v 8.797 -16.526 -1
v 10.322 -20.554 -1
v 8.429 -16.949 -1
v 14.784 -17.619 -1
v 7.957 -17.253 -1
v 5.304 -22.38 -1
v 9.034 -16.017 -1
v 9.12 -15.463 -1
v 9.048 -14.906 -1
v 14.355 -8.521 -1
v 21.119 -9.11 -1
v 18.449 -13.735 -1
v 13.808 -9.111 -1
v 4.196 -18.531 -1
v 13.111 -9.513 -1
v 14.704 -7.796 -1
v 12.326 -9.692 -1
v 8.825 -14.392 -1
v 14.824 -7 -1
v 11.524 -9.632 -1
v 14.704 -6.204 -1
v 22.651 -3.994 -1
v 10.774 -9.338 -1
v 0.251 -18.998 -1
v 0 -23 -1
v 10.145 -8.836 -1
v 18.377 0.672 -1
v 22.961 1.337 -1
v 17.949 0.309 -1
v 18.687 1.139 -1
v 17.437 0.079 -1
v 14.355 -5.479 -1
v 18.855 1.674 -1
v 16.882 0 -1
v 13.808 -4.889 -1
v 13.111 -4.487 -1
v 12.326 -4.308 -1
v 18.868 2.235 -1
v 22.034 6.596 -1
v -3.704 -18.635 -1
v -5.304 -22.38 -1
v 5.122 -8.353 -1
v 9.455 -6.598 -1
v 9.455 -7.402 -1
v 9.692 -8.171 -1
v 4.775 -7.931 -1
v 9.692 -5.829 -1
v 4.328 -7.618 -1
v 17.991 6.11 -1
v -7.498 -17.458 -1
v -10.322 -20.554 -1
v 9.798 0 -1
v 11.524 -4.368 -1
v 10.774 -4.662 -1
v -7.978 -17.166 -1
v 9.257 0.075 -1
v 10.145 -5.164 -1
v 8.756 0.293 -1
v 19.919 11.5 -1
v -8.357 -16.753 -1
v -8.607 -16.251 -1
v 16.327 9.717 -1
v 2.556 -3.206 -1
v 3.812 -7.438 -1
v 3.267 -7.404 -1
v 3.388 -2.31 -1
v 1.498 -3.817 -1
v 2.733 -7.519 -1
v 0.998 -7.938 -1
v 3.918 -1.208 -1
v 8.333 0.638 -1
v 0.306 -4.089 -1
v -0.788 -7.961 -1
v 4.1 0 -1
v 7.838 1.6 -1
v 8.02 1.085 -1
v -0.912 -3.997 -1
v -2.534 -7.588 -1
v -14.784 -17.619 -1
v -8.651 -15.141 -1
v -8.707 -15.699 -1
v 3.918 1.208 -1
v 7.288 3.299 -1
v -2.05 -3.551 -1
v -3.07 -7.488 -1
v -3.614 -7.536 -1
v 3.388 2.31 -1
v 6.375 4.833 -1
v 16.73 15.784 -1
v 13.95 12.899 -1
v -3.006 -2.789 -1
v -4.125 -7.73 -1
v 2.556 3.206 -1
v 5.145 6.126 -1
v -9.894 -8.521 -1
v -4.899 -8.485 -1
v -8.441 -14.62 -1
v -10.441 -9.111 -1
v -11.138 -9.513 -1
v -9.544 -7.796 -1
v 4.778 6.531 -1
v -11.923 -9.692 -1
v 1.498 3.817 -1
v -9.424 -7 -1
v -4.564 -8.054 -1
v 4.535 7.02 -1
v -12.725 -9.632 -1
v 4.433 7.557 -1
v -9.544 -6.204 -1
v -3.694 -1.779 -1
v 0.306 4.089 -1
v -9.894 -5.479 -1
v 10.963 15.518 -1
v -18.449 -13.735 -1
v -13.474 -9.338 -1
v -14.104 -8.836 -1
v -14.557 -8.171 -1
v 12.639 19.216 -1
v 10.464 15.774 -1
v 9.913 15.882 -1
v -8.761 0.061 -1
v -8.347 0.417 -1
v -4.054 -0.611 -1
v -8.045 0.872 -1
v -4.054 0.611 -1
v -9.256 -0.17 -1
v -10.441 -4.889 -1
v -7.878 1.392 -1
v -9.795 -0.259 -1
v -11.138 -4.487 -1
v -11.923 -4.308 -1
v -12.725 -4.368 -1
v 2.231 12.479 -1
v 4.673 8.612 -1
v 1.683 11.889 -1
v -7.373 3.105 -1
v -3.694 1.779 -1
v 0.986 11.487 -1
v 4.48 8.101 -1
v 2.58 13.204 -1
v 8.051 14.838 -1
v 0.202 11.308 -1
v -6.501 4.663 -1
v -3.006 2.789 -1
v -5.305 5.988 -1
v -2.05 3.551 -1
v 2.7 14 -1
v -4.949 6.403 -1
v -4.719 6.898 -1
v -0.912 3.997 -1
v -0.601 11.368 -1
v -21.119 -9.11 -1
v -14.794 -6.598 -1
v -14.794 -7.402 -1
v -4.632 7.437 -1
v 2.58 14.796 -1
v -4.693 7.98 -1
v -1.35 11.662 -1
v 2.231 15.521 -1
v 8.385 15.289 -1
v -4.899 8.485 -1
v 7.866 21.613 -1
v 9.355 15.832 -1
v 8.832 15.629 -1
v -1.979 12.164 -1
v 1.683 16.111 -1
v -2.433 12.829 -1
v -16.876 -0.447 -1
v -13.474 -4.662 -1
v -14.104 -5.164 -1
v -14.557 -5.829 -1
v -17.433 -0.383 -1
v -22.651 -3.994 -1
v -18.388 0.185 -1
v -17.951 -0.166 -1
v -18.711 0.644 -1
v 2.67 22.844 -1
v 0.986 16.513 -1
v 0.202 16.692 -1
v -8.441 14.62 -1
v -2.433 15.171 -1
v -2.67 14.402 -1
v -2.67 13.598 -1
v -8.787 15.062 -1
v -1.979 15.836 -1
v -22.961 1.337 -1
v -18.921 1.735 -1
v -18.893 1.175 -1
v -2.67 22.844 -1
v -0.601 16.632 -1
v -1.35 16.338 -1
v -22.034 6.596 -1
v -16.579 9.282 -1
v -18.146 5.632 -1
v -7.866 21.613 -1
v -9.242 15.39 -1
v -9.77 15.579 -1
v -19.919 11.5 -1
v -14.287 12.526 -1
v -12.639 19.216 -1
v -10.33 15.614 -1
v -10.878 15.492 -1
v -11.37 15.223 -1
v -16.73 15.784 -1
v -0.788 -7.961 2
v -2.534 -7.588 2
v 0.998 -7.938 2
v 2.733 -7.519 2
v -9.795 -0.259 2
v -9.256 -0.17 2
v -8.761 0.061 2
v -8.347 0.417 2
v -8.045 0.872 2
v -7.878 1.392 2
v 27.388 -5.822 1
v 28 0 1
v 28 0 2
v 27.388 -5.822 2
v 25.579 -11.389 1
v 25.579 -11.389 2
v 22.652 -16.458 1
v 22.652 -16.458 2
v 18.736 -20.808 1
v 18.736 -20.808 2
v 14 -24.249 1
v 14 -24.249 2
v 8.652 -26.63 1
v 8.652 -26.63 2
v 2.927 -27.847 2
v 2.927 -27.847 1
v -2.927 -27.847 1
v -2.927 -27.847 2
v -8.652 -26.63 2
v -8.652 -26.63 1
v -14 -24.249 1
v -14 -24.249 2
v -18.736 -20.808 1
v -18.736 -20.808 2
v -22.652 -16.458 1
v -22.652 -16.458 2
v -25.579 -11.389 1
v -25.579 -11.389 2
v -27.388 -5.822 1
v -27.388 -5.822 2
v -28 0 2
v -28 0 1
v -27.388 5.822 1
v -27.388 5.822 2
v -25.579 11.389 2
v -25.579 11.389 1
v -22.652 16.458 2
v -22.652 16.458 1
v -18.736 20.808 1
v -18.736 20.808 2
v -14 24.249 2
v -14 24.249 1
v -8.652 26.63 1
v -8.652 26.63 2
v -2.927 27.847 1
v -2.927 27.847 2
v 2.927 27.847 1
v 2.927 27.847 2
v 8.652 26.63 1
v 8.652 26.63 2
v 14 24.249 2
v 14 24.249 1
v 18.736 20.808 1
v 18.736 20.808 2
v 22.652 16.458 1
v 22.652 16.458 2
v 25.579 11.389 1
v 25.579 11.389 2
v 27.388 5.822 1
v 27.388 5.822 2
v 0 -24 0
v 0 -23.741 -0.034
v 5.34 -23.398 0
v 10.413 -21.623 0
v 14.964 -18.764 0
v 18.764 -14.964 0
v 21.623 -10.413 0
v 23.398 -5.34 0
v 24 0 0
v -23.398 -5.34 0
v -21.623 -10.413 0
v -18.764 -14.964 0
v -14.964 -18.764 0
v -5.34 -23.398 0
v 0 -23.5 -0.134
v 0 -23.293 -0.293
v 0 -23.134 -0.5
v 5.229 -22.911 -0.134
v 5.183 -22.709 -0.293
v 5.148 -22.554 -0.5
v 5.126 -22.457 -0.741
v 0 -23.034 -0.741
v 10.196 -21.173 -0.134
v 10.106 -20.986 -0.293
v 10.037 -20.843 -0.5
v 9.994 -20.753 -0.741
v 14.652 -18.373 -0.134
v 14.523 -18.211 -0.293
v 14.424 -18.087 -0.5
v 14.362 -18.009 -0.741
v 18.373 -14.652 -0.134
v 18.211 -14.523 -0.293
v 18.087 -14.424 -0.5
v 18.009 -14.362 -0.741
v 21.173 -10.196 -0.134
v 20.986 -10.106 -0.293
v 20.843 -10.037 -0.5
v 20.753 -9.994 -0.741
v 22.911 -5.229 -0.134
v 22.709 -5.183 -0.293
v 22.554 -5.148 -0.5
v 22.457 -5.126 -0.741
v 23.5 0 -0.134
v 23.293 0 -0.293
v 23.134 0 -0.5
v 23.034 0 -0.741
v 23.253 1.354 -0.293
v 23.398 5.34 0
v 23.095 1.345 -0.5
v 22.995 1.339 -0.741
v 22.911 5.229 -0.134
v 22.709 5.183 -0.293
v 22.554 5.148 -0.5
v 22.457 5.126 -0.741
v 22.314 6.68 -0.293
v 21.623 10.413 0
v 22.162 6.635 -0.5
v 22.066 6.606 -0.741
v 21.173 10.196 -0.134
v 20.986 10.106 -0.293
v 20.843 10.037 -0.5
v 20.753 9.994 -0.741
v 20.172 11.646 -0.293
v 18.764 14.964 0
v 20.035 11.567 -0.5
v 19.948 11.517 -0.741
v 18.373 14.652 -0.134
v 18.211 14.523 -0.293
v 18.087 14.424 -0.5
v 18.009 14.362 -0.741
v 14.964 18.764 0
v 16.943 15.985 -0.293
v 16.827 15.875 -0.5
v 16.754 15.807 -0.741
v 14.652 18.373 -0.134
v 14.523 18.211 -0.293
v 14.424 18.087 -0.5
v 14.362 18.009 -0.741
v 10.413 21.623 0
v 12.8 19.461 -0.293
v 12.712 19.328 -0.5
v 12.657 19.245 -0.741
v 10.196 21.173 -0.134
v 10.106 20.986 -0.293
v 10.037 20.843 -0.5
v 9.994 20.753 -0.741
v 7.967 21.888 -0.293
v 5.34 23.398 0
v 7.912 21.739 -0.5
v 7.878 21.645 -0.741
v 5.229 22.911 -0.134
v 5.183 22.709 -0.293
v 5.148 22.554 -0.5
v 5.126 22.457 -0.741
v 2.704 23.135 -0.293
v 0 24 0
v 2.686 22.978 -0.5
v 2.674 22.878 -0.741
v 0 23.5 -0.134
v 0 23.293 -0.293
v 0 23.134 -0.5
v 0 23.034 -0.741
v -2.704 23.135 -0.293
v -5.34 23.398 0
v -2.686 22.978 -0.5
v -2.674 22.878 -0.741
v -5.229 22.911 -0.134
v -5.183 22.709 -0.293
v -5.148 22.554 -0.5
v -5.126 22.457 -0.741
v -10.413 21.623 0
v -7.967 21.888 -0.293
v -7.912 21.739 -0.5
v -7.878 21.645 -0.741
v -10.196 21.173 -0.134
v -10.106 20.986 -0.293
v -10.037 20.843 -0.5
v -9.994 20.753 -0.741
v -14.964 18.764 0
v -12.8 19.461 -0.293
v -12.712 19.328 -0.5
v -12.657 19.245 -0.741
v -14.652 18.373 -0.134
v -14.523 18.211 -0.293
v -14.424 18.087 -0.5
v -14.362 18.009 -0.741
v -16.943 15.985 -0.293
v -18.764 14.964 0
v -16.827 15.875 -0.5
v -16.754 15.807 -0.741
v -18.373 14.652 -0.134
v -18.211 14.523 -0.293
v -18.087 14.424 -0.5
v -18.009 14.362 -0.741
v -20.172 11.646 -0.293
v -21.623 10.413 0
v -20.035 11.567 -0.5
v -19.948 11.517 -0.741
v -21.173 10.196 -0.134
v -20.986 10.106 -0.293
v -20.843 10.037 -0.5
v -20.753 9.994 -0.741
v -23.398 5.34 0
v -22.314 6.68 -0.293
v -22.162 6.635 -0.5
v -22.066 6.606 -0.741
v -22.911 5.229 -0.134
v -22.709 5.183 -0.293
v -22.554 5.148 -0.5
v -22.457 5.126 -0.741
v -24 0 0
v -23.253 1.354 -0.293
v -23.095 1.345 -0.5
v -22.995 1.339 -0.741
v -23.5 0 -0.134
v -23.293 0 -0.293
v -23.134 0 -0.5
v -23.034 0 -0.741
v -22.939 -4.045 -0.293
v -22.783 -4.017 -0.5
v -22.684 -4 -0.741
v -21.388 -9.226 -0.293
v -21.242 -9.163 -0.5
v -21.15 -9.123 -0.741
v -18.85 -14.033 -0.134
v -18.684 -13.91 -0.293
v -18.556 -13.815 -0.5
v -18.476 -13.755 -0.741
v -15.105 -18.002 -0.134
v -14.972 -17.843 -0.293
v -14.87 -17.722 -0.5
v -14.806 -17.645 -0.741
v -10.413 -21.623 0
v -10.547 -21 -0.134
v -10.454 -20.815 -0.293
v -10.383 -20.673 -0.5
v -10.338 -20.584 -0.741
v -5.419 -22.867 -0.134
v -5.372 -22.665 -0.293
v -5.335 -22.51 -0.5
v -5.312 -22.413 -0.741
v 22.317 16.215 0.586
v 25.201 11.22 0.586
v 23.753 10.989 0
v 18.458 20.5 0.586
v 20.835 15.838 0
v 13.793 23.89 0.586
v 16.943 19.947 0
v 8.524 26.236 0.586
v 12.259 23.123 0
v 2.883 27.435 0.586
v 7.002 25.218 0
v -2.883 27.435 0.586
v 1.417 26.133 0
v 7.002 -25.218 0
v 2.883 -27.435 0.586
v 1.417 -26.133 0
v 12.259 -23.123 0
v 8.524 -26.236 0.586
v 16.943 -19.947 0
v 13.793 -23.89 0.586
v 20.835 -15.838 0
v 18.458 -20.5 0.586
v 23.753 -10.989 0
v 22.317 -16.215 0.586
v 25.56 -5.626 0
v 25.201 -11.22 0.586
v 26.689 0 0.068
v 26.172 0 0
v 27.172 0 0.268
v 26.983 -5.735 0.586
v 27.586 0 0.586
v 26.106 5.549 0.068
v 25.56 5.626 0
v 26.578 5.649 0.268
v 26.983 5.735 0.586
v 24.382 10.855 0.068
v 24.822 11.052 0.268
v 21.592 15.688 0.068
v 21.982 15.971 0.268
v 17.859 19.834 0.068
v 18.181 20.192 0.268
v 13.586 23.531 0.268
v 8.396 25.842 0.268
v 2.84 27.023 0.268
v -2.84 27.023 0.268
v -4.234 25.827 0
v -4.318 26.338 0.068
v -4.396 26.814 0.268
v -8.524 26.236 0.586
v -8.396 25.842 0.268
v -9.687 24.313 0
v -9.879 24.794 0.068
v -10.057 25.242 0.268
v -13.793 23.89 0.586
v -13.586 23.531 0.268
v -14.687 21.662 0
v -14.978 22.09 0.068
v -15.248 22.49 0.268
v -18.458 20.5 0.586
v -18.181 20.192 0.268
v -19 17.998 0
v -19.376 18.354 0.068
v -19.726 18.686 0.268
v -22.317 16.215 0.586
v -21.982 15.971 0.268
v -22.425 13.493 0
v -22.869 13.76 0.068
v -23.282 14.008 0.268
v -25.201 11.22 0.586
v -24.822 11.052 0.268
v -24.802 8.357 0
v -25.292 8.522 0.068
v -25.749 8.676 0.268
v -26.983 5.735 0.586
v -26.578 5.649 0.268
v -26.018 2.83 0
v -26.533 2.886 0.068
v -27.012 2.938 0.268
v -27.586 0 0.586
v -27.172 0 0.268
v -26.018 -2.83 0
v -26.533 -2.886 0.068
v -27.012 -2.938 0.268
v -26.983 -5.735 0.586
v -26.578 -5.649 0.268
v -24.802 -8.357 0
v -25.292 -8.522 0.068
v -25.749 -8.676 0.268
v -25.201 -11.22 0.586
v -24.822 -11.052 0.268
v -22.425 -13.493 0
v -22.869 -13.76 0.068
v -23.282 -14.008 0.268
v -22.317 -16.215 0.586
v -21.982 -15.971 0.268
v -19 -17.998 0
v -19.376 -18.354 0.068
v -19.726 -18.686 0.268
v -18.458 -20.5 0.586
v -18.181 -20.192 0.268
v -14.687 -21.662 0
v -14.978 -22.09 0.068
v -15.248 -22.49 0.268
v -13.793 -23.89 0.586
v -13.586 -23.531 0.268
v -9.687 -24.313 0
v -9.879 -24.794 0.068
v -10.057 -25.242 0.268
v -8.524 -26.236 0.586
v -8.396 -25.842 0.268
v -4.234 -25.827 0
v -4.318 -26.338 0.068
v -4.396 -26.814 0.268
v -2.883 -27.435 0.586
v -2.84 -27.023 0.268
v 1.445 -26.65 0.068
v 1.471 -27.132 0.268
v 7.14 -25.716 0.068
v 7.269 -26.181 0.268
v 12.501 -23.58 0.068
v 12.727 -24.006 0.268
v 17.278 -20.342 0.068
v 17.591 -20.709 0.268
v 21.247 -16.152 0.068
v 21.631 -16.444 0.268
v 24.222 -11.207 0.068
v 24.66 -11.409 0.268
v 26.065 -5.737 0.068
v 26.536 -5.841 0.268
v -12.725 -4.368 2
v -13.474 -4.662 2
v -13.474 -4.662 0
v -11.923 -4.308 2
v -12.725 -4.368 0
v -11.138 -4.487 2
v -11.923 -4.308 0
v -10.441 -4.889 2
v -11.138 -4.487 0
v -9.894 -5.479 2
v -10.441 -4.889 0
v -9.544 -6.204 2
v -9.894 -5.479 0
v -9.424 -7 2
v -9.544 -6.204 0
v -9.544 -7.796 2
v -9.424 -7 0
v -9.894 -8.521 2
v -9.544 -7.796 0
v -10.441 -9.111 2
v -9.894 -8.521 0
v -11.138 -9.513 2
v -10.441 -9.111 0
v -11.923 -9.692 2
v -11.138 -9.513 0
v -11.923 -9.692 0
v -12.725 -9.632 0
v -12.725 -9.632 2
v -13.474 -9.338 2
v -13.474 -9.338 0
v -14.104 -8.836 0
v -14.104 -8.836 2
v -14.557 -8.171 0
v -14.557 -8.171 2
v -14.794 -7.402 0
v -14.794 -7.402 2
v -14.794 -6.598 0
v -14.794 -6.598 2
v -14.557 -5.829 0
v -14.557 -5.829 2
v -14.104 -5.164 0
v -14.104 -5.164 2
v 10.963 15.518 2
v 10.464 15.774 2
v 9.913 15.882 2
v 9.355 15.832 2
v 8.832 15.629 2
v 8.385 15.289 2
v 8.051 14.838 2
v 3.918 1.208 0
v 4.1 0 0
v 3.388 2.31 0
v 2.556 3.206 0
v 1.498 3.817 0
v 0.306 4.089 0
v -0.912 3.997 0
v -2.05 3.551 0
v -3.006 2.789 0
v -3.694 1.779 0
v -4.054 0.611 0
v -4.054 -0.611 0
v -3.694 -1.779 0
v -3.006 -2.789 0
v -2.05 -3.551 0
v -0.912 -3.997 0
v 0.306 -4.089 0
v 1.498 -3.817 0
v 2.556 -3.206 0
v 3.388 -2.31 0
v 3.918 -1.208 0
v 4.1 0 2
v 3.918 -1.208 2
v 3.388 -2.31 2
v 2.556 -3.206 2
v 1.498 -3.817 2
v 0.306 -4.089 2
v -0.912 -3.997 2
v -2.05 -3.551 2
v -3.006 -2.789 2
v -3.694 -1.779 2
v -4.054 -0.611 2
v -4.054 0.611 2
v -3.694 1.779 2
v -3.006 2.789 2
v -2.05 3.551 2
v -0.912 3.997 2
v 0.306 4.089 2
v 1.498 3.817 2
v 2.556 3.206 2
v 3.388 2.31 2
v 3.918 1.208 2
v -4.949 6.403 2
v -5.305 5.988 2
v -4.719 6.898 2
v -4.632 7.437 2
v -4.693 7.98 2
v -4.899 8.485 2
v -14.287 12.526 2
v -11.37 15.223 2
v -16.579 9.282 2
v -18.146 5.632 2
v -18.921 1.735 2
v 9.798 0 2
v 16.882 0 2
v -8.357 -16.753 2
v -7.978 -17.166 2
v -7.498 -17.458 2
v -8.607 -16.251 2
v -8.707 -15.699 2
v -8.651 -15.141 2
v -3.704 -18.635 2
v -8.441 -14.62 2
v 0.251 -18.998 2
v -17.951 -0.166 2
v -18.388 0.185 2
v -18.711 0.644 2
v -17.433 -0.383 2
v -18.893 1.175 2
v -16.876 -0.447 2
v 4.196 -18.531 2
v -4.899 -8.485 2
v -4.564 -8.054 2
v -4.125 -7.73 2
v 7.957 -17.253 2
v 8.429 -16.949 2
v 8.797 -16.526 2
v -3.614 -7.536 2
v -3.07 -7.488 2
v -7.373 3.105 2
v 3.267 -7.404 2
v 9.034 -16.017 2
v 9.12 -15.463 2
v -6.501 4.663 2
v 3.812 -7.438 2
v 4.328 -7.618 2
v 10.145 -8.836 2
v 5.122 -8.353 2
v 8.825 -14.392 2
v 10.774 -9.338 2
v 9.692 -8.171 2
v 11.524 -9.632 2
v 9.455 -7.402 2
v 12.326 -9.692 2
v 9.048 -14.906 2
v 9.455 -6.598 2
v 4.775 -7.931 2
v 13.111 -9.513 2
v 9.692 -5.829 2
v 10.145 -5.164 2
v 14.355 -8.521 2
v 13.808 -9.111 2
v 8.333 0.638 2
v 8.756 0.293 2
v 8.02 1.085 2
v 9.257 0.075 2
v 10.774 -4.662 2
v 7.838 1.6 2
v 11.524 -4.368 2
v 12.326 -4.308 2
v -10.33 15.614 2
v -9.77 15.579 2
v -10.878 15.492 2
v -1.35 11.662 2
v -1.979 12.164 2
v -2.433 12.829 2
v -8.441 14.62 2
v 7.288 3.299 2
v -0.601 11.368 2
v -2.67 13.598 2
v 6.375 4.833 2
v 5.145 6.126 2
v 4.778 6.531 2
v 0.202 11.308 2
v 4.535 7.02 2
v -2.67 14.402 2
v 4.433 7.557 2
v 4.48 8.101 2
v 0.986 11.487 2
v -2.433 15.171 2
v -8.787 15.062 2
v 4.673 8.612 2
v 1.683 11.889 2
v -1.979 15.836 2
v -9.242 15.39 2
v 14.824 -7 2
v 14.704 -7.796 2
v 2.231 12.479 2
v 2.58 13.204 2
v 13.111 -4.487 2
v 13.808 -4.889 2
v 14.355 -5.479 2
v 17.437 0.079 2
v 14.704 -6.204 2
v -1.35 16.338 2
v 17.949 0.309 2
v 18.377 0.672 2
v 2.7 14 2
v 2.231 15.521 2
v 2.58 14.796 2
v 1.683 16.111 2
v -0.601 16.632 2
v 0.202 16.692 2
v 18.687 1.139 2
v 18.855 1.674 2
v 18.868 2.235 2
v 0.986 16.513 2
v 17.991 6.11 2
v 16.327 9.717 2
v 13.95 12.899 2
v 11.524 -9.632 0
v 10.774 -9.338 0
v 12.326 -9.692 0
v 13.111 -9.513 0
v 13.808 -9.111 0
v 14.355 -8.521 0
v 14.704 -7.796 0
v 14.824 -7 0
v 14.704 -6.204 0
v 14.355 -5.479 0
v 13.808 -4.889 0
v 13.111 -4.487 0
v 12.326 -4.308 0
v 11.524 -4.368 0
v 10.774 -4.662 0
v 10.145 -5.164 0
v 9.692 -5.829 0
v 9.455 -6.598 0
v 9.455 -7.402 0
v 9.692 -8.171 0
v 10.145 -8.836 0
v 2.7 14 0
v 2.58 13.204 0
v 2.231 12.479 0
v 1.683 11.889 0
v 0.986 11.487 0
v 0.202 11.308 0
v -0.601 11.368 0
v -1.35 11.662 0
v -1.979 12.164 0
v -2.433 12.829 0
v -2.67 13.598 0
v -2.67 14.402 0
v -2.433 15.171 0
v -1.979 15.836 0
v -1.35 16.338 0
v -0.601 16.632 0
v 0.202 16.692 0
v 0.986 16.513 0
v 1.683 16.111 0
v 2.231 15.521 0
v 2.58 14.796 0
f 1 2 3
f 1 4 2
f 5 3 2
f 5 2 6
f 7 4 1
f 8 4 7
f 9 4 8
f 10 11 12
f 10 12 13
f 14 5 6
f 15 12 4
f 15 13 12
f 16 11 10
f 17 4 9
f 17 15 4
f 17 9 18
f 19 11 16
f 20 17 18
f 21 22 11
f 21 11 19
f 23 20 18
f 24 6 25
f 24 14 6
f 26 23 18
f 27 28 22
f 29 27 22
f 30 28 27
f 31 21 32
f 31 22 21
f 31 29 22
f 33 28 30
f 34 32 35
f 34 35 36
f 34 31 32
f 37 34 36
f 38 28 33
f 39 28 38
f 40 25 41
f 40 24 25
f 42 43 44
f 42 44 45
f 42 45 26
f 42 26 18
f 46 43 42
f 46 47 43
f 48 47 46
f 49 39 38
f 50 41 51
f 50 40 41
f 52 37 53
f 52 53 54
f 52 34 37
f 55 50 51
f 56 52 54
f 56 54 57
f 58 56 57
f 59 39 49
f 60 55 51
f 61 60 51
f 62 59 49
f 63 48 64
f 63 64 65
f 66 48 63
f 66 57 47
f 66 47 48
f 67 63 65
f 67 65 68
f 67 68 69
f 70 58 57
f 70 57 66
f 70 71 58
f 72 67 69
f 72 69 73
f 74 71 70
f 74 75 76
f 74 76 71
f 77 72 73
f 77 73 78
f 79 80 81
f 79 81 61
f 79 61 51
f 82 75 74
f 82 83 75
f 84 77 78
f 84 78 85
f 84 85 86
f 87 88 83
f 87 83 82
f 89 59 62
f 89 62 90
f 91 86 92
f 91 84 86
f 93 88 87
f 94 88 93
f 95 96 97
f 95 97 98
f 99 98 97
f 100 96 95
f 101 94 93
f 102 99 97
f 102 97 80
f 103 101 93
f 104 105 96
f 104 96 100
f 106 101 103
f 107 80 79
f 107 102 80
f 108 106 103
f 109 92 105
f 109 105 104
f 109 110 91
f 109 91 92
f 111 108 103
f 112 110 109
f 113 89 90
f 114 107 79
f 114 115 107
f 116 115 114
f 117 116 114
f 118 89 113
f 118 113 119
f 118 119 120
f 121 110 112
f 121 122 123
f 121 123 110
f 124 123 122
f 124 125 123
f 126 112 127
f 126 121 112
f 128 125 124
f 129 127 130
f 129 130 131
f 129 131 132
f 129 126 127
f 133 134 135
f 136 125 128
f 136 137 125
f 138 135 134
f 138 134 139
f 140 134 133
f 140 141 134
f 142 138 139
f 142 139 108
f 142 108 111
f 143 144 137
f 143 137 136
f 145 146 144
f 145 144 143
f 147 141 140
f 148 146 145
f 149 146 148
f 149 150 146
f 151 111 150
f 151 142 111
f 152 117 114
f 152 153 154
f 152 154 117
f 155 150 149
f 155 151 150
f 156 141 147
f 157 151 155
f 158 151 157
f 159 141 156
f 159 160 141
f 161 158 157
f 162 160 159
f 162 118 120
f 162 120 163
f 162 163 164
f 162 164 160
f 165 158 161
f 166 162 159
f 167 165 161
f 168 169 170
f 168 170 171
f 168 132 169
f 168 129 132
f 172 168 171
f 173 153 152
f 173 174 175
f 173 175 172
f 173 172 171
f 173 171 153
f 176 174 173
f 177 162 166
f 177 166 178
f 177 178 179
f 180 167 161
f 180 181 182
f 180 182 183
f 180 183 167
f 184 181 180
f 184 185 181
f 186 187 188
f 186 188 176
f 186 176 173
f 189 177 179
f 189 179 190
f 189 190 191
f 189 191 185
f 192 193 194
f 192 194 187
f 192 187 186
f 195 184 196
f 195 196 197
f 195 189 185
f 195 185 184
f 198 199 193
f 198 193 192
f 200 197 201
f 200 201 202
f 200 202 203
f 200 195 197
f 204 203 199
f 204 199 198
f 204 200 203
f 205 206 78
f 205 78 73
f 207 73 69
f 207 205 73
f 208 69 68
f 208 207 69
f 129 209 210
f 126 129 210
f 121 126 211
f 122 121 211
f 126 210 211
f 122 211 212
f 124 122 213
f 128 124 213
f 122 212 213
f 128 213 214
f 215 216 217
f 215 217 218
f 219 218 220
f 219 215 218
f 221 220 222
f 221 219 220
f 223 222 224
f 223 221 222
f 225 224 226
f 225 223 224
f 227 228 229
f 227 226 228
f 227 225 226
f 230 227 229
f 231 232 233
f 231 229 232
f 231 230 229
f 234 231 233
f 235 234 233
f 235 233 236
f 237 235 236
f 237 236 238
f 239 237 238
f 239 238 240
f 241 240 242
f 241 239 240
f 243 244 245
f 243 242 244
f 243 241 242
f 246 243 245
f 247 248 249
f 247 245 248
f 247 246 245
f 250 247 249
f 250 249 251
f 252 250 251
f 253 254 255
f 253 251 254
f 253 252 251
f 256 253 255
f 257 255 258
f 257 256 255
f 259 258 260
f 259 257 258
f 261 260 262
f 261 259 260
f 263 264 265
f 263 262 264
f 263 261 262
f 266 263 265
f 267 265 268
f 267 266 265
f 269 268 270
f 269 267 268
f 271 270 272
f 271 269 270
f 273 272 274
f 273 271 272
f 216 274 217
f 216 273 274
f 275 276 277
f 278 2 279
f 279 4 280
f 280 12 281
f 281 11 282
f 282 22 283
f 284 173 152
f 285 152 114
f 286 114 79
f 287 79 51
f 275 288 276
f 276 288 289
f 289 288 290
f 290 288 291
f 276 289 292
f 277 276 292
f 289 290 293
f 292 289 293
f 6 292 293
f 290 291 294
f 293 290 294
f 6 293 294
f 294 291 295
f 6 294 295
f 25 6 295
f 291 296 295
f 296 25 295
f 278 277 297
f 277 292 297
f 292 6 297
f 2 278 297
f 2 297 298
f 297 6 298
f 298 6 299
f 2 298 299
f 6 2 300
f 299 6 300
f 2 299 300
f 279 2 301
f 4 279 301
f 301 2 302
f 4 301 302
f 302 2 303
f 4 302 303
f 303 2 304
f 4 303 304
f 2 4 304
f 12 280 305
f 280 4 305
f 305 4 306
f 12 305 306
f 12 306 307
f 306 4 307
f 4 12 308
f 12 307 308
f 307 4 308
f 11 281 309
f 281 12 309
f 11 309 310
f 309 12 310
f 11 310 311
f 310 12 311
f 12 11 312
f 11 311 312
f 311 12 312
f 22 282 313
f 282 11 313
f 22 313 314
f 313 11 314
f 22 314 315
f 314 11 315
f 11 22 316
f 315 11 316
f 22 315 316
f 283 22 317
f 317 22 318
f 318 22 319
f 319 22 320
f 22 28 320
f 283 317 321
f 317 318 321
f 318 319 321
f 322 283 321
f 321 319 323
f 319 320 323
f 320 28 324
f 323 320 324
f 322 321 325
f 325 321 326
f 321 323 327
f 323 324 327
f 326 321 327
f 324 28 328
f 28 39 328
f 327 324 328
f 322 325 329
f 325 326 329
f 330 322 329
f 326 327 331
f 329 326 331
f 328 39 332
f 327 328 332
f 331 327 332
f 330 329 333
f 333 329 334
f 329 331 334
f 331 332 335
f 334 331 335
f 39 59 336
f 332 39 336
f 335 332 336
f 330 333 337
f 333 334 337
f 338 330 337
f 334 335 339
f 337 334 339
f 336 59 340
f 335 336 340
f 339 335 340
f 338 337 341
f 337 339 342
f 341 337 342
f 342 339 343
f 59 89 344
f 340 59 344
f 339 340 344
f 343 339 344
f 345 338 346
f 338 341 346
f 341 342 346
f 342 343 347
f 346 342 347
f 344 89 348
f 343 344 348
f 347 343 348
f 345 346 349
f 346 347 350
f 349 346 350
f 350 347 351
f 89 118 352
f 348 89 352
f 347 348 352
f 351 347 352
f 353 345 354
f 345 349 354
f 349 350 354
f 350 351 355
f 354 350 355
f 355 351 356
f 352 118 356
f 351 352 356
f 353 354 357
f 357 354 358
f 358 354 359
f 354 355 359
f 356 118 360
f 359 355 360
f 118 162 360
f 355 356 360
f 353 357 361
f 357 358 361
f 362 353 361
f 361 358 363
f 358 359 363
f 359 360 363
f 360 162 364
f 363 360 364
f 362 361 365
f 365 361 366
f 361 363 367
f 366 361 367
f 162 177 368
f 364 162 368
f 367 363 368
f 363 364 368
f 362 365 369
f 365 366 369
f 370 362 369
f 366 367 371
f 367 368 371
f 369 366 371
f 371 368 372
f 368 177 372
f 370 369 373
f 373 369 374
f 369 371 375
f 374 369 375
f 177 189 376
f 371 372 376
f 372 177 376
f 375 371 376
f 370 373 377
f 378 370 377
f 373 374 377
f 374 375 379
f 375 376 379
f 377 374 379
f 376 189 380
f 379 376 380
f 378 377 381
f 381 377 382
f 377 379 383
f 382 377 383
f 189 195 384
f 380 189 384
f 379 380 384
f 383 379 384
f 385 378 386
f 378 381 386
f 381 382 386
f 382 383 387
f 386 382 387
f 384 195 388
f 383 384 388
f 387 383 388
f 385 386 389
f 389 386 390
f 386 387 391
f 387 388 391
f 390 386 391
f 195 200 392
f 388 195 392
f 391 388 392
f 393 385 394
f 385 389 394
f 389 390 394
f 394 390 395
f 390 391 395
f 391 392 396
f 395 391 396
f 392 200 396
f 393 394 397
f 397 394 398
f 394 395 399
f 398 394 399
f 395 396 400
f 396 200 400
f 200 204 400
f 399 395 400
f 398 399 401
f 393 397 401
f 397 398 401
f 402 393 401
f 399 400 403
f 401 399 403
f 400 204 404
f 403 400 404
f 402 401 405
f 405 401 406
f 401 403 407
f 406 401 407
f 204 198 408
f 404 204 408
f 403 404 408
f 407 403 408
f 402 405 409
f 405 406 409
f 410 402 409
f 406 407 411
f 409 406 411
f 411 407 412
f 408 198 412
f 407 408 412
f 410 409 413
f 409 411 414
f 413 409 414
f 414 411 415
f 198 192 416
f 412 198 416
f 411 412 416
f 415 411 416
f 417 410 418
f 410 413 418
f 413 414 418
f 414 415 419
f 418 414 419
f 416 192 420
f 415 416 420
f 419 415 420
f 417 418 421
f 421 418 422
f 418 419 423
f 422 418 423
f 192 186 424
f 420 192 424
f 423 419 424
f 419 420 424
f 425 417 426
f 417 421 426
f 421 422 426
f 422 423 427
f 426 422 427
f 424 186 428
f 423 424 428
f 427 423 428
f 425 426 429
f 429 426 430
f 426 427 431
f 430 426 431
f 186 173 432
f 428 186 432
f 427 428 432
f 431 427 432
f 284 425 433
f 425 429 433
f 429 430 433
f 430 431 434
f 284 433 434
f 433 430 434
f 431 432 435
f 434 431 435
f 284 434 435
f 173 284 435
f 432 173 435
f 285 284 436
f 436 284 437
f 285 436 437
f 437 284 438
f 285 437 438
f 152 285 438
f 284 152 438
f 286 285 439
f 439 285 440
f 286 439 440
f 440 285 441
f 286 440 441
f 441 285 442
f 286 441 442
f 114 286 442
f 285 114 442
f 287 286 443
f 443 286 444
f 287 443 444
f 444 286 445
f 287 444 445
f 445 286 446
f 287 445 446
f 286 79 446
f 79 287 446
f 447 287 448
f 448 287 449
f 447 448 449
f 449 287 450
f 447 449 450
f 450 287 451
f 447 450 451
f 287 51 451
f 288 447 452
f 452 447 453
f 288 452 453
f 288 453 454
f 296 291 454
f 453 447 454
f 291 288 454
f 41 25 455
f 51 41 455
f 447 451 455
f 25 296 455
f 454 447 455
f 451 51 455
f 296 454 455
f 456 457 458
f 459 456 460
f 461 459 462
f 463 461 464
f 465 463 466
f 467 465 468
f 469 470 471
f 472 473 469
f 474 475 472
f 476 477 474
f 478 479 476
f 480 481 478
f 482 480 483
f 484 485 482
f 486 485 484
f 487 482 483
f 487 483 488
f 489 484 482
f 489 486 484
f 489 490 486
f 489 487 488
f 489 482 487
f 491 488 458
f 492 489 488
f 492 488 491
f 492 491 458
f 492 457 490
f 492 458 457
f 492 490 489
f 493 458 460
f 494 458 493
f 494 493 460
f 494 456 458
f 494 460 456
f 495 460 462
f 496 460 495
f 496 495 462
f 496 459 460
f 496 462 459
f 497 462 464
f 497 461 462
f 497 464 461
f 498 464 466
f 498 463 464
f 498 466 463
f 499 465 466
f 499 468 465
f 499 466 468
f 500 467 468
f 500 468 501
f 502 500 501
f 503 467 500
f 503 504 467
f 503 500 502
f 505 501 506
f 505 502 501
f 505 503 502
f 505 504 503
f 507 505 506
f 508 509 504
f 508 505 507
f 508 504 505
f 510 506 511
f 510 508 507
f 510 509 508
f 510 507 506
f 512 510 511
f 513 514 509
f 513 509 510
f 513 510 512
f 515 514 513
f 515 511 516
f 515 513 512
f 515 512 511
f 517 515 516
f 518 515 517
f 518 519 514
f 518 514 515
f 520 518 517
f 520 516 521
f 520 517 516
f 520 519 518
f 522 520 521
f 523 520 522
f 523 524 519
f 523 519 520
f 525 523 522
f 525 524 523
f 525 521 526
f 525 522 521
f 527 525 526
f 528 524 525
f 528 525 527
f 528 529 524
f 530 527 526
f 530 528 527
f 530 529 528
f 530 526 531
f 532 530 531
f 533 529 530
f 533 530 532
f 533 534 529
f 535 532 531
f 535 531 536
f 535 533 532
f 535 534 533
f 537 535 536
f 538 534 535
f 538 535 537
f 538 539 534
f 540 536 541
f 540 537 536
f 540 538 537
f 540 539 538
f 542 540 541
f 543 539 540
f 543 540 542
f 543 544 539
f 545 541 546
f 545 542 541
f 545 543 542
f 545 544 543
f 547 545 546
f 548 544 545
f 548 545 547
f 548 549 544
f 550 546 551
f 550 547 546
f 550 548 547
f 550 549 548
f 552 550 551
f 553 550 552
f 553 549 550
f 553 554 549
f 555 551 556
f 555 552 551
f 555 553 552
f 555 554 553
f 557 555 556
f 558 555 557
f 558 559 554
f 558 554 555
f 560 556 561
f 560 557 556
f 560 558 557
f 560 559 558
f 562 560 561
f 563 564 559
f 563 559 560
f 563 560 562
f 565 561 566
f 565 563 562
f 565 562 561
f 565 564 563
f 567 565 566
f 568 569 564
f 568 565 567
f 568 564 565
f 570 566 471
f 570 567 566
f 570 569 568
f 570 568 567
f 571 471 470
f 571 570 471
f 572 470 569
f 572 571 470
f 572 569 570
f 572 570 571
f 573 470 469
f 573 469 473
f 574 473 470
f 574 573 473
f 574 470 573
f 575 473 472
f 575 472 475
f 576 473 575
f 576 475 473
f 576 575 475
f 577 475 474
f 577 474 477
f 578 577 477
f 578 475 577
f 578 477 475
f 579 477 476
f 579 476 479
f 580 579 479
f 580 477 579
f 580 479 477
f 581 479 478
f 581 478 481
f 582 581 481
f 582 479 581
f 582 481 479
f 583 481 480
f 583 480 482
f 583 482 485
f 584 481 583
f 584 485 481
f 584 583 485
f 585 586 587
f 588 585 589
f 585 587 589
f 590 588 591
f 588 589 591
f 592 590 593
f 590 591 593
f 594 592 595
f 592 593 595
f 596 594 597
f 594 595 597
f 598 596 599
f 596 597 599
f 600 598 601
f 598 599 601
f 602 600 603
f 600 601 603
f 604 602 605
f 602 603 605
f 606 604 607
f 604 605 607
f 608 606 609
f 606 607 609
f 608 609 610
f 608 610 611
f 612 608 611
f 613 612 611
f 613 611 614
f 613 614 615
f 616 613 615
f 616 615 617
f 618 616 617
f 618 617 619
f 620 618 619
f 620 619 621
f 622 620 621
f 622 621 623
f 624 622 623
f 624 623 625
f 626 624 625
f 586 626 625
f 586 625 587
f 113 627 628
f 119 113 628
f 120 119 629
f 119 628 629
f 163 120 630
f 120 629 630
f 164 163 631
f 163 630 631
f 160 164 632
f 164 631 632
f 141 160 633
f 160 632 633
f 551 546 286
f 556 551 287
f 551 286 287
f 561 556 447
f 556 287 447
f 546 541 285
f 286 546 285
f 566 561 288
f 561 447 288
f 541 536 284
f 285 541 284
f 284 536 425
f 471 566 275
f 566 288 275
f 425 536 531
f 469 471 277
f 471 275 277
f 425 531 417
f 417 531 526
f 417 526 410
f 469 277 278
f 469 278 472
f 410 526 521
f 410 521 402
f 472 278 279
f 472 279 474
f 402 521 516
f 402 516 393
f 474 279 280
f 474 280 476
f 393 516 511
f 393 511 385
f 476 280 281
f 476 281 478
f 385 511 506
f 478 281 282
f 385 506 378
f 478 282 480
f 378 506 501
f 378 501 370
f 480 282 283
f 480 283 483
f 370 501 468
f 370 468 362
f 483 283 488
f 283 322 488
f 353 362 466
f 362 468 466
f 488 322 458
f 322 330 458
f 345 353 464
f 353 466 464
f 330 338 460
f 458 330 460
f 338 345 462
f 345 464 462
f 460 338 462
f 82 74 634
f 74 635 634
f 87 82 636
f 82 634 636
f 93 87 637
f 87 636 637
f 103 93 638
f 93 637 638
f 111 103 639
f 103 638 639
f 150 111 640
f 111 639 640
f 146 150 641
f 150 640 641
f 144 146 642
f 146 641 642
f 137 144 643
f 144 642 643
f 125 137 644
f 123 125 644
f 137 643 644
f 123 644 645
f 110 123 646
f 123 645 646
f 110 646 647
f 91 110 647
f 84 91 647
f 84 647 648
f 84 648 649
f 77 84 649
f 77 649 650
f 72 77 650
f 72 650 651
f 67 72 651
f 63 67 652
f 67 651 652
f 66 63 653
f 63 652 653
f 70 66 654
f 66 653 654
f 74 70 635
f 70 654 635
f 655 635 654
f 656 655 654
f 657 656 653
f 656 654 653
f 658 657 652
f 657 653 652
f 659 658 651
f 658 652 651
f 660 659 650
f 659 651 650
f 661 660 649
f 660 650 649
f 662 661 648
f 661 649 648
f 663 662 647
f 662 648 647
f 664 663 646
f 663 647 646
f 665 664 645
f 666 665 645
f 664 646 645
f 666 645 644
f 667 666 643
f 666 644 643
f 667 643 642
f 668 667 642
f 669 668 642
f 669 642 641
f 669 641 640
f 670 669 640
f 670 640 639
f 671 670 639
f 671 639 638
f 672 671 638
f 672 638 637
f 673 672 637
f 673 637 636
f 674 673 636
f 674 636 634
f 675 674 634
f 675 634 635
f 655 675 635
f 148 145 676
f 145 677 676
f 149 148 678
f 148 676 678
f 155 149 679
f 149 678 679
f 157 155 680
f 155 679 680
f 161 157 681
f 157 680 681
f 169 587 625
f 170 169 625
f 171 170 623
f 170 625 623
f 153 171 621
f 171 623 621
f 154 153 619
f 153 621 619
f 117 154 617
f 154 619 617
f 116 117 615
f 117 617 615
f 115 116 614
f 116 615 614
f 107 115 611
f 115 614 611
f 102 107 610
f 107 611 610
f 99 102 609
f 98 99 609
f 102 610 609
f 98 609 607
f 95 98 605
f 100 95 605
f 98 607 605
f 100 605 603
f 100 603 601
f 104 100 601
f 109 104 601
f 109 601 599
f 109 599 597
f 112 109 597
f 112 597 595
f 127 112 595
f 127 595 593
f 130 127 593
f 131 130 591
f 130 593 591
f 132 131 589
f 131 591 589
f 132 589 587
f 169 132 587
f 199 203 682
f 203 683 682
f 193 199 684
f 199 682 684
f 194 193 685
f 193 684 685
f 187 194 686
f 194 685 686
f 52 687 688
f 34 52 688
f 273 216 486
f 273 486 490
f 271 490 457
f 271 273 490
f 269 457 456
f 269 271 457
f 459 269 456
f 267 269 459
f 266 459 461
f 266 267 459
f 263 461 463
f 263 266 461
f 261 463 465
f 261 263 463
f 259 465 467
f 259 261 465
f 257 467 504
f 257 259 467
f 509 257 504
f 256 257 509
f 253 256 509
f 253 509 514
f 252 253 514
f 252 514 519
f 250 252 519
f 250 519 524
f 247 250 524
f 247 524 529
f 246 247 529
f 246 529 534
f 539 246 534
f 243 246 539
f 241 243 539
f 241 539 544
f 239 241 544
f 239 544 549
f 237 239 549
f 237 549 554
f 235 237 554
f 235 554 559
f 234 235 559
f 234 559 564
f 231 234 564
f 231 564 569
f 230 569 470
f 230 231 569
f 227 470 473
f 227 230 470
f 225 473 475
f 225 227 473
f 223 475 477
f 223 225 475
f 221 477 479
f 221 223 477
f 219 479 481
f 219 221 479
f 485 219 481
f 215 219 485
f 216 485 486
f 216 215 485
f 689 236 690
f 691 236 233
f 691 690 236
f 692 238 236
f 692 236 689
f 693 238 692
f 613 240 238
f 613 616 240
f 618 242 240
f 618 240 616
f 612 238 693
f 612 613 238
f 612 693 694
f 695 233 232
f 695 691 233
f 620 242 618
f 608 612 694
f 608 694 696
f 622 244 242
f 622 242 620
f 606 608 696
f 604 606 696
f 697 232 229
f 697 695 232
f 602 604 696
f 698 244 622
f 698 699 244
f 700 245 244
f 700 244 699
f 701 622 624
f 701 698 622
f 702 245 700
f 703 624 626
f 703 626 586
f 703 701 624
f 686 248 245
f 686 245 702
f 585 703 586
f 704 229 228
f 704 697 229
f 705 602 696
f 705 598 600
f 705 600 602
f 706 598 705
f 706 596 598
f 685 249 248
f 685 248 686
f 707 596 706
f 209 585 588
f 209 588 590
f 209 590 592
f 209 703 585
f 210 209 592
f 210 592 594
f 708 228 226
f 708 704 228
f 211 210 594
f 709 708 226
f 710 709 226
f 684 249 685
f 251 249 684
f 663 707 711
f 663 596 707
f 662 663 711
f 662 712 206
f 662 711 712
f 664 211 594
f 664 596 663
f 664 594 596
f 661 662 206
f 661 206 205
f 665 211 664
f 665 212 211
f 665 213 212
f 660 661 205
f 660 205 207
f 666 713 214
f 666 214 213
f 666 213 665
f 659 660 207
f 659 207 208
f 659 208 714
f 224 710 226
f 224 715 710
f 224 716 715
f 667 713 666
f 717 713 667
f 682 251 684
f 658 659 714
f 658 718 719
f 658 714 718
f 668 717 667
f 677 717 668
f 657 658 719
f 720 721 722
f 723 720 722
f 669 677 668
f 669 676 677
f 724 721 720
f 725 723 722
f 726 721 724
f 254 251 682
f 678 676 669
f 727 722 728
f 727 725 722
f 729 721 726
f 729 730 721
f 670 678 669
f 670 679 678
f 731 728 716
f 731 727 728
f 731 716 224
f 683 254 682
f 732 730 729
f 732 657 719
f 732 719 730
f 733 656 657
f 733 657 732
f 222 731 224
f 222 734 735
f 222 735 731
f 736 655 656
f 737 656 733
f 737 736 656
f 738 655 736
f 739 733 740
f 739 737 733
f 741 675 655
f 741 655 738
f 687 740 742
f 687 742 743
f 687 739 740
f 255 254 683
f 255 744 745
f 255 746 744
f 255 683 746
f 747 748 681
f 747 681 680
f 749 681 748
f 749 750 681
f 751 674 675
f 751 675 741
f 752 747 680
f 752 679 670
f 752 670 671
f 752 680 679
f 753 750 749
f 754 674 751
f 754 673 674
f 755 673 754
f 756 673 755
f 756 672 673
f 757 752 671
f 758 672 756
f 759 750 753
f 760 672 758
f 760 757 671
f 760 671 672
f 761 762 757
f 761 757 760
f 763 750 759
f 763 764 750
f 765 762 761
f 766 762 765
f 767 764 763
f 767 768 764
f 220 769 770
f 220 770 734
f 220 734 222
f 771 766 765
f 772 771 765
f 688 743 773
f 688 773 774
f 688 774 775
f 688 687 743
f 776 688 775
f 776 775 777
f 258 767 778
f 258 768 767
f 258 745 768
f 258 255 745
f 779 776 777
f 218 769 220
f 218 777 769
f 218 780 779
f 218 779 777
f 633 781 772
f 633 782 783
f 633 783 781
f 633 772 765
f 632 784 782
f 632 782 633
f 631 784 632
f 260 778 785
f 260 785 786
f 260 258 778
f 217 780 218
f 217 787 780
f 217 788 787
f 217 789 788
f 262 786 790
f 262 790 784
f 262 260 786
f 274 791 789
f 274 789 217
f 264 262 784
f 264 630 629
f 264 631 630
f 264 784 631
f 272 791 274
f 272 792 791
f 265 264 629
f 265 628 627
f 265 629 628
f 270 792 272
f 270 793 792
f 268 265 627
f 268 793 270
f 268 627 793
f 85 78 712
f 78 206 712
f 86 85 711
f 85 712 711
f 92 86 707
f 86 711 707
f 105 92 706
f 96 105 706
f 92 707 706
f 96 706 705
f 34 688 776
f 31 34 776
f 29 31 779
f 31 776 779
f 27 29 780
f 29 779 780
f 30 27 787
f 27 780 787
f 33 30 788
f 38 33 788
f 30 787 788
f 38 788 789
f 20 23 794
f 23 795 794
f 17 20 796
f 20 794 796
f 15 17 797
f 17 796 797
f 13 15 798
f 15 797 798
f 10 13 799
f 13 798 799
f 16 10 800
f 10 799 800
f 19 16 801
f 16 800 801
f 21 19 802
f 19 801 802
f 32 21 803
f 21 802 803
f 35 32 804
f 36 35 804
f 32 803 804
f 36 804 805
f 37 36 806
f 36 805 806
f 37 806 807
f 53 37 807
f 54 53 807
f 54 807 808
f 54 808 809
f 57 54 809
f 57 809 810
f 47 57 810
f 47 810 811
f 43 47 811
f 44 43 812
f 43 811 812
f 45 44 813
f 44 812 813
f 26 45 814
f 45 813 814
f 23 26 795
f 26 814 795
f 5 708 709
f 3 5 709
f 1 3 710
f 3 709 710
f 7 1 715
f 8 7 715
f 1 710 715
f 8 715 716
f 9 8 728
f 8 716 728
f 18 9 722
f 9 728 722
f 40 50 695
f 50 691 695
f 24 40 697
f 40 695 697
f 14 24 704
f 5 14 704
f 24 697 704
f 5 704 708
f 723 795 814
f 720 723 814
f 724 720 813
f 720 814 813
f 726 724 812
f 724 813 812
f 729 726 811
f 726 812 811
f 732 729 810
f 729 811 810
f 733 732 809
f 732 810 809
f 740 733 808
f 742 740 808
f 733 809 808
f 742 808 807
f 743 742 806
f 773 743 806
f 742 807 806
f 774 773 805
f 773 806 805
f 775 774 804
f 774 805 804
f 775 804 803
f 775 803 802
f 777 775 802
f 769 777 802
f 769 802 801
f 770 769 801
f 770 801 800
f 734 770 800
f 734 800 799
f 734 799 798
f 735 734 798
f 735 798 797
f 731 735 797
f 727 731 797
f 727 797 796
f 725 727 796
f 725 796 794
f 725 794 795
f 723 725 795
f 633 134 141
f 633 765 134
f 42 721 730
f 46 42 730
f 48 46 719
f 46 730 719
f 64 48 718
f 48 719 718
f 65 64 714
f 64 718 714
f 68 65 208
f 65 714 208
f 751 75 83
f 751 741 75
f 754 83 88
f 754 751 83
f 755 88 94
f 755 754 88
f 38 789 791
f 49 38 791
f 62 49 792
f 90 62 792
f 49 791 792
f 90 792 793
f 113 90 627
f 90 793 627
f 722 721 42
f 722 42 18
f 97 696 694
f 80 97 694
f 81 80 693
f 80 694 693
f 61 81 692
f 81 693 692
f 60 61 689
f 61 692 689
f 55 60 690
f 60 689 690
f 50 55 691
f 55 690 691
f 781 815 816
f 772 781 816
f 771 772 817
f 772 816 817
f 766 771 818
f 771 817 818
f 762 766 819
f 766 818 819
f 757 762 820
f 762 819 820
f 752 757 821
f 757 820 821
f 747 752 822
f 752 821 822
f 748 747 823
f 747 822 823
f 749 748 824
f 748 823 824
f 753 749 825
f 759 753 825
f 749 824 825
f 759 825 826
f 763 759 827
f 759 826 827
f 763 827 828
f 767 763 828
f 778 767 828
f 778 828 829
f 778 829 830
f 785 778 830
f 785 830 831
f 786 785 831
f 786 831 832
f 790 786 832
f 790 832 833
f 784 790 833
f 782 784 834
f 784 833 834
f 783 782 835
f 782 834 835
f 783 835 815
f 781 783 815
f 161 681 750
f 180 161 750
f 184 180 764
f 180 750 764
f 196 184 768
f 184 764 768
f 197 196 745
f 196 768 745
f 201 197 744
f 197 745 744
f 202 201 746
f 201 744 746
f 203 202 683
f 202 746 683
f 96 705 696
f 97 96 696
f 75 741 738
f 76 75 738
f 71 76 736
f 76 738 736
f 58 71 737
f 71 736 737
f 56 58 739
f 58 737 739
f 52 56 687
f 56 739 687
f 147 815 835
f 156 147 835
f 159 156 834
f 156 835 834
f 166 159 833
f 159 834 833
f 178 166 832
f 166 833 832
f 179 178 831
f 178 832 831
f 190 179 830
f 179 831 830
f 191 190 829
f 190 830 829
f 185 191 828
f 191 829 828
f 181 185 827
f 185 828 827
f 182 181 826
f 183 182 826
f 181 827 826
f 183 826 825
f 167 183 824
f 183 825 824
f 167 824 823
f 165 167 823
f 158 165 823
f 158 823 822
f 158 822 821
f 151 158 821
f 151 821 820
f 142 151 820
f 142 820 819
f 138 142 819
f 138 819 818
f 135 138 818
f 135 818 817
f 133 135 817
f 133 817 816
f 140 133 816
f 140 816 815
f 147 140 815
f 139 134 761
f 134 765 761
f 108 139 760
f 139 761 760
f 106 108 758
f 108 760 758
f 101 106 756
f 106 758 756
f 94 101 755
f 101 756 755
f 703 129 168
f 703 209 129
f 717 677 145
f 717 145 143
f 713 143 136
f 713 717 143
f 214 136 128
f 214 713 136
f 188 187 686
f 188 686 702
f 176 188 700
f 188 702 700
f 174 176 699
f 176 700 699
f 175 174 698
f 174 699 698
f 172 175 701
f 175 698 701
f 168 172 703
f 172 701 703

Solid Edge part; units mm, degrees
sketch "Sketch1" plane through (0, 0, 0) normal (0, 0, 1) x (1, 0, 0)
  circle A0 centre (0, 0) radius 28
extrude "Protrusion1" add sketch "Sketch1" along normal blind 2
sketch "Sketch2" plane through (0, 0, 0) normal (0, 0, -1) x (0, -1, 0)
  circle A0 centre (0, 0) radius 23
extrude "ExtrudedProtrusion_2" add sketch "Sketch2" along normal blind 1
sketch "Sketch3" plane through (0, 0, 0) normal (0, 0, 1) x (1, 0, 0)
  circle A0 centre (0, 14) radius 2.7
  dimension "D1" = 14
  dimension "D2" = 5.4
extrude "Cutout1" cut sketch "Sketch3" along normal through all and the other way through all
pattern_circular "Pattern1" count 3 over 360 about axis through (0, 0, 2) along (0, 0, -1) of "Cutout1"
sketch "Sketch4" plane through (0, 0, 0) normal (0, 0, 1) x (1, 0, 0)
  circle A0 centre (0, 0) radius 4.1
  dimension "D1" = 8.2
extrude "Cutout4" cut sketch "Sketch4" along normal through all and the other way through all
sketch "Sketch5" plane through (0, 0, -1) normal (0, 0, -1) x (0, 1, 0)
  line L0 (0, 9.798) -> (0, 16.8819)
  arc A0 (2.2353, 18.8681) -> (0, 16.8819) centre (2, 16.8819) ccw
  arc A1 (14.8383, 8.0513) -> (15.518, 10.9632) centre (13.8845, 9.8092) ccw
  line L1 (8.6119, 4.6728) -> (14.8383, 8.0513)
  arc A2 (6.1264, 5.1446) -> (8.6119, 4.6728) centre (7.6581, 6.4307) ccw
  arc A3 (0, 9.798) -> (1.6, 7.8384) centre (2, 9.798) ccw
  arc A4 (6.1264, 5.1446) -> (1.6, 7.8384) centre (0, 0) ccw
  arc A5 (2.2353, 18.8681) -> (15.518, 10.9632) centre (0, 0) cw
extrude "Cutout5" cut sketch "Sketch5" along normal through all and the other way through all
pattern_circular "Pattern2" count 3 over 360 about axis through (0, 0, -1) along (0, 0, 1) of "Cutout5"
fillet "Round_1" radius 1 1 edges at (23, 0, 0)
chamfer "Chamfer_1" distance 1 angle 45 1 edges at (-28, 0, 0)
fillet "Round_2" radius 2 1 edges at (27, 0, 0)
properties material "ABS Plastic, medium impact"
